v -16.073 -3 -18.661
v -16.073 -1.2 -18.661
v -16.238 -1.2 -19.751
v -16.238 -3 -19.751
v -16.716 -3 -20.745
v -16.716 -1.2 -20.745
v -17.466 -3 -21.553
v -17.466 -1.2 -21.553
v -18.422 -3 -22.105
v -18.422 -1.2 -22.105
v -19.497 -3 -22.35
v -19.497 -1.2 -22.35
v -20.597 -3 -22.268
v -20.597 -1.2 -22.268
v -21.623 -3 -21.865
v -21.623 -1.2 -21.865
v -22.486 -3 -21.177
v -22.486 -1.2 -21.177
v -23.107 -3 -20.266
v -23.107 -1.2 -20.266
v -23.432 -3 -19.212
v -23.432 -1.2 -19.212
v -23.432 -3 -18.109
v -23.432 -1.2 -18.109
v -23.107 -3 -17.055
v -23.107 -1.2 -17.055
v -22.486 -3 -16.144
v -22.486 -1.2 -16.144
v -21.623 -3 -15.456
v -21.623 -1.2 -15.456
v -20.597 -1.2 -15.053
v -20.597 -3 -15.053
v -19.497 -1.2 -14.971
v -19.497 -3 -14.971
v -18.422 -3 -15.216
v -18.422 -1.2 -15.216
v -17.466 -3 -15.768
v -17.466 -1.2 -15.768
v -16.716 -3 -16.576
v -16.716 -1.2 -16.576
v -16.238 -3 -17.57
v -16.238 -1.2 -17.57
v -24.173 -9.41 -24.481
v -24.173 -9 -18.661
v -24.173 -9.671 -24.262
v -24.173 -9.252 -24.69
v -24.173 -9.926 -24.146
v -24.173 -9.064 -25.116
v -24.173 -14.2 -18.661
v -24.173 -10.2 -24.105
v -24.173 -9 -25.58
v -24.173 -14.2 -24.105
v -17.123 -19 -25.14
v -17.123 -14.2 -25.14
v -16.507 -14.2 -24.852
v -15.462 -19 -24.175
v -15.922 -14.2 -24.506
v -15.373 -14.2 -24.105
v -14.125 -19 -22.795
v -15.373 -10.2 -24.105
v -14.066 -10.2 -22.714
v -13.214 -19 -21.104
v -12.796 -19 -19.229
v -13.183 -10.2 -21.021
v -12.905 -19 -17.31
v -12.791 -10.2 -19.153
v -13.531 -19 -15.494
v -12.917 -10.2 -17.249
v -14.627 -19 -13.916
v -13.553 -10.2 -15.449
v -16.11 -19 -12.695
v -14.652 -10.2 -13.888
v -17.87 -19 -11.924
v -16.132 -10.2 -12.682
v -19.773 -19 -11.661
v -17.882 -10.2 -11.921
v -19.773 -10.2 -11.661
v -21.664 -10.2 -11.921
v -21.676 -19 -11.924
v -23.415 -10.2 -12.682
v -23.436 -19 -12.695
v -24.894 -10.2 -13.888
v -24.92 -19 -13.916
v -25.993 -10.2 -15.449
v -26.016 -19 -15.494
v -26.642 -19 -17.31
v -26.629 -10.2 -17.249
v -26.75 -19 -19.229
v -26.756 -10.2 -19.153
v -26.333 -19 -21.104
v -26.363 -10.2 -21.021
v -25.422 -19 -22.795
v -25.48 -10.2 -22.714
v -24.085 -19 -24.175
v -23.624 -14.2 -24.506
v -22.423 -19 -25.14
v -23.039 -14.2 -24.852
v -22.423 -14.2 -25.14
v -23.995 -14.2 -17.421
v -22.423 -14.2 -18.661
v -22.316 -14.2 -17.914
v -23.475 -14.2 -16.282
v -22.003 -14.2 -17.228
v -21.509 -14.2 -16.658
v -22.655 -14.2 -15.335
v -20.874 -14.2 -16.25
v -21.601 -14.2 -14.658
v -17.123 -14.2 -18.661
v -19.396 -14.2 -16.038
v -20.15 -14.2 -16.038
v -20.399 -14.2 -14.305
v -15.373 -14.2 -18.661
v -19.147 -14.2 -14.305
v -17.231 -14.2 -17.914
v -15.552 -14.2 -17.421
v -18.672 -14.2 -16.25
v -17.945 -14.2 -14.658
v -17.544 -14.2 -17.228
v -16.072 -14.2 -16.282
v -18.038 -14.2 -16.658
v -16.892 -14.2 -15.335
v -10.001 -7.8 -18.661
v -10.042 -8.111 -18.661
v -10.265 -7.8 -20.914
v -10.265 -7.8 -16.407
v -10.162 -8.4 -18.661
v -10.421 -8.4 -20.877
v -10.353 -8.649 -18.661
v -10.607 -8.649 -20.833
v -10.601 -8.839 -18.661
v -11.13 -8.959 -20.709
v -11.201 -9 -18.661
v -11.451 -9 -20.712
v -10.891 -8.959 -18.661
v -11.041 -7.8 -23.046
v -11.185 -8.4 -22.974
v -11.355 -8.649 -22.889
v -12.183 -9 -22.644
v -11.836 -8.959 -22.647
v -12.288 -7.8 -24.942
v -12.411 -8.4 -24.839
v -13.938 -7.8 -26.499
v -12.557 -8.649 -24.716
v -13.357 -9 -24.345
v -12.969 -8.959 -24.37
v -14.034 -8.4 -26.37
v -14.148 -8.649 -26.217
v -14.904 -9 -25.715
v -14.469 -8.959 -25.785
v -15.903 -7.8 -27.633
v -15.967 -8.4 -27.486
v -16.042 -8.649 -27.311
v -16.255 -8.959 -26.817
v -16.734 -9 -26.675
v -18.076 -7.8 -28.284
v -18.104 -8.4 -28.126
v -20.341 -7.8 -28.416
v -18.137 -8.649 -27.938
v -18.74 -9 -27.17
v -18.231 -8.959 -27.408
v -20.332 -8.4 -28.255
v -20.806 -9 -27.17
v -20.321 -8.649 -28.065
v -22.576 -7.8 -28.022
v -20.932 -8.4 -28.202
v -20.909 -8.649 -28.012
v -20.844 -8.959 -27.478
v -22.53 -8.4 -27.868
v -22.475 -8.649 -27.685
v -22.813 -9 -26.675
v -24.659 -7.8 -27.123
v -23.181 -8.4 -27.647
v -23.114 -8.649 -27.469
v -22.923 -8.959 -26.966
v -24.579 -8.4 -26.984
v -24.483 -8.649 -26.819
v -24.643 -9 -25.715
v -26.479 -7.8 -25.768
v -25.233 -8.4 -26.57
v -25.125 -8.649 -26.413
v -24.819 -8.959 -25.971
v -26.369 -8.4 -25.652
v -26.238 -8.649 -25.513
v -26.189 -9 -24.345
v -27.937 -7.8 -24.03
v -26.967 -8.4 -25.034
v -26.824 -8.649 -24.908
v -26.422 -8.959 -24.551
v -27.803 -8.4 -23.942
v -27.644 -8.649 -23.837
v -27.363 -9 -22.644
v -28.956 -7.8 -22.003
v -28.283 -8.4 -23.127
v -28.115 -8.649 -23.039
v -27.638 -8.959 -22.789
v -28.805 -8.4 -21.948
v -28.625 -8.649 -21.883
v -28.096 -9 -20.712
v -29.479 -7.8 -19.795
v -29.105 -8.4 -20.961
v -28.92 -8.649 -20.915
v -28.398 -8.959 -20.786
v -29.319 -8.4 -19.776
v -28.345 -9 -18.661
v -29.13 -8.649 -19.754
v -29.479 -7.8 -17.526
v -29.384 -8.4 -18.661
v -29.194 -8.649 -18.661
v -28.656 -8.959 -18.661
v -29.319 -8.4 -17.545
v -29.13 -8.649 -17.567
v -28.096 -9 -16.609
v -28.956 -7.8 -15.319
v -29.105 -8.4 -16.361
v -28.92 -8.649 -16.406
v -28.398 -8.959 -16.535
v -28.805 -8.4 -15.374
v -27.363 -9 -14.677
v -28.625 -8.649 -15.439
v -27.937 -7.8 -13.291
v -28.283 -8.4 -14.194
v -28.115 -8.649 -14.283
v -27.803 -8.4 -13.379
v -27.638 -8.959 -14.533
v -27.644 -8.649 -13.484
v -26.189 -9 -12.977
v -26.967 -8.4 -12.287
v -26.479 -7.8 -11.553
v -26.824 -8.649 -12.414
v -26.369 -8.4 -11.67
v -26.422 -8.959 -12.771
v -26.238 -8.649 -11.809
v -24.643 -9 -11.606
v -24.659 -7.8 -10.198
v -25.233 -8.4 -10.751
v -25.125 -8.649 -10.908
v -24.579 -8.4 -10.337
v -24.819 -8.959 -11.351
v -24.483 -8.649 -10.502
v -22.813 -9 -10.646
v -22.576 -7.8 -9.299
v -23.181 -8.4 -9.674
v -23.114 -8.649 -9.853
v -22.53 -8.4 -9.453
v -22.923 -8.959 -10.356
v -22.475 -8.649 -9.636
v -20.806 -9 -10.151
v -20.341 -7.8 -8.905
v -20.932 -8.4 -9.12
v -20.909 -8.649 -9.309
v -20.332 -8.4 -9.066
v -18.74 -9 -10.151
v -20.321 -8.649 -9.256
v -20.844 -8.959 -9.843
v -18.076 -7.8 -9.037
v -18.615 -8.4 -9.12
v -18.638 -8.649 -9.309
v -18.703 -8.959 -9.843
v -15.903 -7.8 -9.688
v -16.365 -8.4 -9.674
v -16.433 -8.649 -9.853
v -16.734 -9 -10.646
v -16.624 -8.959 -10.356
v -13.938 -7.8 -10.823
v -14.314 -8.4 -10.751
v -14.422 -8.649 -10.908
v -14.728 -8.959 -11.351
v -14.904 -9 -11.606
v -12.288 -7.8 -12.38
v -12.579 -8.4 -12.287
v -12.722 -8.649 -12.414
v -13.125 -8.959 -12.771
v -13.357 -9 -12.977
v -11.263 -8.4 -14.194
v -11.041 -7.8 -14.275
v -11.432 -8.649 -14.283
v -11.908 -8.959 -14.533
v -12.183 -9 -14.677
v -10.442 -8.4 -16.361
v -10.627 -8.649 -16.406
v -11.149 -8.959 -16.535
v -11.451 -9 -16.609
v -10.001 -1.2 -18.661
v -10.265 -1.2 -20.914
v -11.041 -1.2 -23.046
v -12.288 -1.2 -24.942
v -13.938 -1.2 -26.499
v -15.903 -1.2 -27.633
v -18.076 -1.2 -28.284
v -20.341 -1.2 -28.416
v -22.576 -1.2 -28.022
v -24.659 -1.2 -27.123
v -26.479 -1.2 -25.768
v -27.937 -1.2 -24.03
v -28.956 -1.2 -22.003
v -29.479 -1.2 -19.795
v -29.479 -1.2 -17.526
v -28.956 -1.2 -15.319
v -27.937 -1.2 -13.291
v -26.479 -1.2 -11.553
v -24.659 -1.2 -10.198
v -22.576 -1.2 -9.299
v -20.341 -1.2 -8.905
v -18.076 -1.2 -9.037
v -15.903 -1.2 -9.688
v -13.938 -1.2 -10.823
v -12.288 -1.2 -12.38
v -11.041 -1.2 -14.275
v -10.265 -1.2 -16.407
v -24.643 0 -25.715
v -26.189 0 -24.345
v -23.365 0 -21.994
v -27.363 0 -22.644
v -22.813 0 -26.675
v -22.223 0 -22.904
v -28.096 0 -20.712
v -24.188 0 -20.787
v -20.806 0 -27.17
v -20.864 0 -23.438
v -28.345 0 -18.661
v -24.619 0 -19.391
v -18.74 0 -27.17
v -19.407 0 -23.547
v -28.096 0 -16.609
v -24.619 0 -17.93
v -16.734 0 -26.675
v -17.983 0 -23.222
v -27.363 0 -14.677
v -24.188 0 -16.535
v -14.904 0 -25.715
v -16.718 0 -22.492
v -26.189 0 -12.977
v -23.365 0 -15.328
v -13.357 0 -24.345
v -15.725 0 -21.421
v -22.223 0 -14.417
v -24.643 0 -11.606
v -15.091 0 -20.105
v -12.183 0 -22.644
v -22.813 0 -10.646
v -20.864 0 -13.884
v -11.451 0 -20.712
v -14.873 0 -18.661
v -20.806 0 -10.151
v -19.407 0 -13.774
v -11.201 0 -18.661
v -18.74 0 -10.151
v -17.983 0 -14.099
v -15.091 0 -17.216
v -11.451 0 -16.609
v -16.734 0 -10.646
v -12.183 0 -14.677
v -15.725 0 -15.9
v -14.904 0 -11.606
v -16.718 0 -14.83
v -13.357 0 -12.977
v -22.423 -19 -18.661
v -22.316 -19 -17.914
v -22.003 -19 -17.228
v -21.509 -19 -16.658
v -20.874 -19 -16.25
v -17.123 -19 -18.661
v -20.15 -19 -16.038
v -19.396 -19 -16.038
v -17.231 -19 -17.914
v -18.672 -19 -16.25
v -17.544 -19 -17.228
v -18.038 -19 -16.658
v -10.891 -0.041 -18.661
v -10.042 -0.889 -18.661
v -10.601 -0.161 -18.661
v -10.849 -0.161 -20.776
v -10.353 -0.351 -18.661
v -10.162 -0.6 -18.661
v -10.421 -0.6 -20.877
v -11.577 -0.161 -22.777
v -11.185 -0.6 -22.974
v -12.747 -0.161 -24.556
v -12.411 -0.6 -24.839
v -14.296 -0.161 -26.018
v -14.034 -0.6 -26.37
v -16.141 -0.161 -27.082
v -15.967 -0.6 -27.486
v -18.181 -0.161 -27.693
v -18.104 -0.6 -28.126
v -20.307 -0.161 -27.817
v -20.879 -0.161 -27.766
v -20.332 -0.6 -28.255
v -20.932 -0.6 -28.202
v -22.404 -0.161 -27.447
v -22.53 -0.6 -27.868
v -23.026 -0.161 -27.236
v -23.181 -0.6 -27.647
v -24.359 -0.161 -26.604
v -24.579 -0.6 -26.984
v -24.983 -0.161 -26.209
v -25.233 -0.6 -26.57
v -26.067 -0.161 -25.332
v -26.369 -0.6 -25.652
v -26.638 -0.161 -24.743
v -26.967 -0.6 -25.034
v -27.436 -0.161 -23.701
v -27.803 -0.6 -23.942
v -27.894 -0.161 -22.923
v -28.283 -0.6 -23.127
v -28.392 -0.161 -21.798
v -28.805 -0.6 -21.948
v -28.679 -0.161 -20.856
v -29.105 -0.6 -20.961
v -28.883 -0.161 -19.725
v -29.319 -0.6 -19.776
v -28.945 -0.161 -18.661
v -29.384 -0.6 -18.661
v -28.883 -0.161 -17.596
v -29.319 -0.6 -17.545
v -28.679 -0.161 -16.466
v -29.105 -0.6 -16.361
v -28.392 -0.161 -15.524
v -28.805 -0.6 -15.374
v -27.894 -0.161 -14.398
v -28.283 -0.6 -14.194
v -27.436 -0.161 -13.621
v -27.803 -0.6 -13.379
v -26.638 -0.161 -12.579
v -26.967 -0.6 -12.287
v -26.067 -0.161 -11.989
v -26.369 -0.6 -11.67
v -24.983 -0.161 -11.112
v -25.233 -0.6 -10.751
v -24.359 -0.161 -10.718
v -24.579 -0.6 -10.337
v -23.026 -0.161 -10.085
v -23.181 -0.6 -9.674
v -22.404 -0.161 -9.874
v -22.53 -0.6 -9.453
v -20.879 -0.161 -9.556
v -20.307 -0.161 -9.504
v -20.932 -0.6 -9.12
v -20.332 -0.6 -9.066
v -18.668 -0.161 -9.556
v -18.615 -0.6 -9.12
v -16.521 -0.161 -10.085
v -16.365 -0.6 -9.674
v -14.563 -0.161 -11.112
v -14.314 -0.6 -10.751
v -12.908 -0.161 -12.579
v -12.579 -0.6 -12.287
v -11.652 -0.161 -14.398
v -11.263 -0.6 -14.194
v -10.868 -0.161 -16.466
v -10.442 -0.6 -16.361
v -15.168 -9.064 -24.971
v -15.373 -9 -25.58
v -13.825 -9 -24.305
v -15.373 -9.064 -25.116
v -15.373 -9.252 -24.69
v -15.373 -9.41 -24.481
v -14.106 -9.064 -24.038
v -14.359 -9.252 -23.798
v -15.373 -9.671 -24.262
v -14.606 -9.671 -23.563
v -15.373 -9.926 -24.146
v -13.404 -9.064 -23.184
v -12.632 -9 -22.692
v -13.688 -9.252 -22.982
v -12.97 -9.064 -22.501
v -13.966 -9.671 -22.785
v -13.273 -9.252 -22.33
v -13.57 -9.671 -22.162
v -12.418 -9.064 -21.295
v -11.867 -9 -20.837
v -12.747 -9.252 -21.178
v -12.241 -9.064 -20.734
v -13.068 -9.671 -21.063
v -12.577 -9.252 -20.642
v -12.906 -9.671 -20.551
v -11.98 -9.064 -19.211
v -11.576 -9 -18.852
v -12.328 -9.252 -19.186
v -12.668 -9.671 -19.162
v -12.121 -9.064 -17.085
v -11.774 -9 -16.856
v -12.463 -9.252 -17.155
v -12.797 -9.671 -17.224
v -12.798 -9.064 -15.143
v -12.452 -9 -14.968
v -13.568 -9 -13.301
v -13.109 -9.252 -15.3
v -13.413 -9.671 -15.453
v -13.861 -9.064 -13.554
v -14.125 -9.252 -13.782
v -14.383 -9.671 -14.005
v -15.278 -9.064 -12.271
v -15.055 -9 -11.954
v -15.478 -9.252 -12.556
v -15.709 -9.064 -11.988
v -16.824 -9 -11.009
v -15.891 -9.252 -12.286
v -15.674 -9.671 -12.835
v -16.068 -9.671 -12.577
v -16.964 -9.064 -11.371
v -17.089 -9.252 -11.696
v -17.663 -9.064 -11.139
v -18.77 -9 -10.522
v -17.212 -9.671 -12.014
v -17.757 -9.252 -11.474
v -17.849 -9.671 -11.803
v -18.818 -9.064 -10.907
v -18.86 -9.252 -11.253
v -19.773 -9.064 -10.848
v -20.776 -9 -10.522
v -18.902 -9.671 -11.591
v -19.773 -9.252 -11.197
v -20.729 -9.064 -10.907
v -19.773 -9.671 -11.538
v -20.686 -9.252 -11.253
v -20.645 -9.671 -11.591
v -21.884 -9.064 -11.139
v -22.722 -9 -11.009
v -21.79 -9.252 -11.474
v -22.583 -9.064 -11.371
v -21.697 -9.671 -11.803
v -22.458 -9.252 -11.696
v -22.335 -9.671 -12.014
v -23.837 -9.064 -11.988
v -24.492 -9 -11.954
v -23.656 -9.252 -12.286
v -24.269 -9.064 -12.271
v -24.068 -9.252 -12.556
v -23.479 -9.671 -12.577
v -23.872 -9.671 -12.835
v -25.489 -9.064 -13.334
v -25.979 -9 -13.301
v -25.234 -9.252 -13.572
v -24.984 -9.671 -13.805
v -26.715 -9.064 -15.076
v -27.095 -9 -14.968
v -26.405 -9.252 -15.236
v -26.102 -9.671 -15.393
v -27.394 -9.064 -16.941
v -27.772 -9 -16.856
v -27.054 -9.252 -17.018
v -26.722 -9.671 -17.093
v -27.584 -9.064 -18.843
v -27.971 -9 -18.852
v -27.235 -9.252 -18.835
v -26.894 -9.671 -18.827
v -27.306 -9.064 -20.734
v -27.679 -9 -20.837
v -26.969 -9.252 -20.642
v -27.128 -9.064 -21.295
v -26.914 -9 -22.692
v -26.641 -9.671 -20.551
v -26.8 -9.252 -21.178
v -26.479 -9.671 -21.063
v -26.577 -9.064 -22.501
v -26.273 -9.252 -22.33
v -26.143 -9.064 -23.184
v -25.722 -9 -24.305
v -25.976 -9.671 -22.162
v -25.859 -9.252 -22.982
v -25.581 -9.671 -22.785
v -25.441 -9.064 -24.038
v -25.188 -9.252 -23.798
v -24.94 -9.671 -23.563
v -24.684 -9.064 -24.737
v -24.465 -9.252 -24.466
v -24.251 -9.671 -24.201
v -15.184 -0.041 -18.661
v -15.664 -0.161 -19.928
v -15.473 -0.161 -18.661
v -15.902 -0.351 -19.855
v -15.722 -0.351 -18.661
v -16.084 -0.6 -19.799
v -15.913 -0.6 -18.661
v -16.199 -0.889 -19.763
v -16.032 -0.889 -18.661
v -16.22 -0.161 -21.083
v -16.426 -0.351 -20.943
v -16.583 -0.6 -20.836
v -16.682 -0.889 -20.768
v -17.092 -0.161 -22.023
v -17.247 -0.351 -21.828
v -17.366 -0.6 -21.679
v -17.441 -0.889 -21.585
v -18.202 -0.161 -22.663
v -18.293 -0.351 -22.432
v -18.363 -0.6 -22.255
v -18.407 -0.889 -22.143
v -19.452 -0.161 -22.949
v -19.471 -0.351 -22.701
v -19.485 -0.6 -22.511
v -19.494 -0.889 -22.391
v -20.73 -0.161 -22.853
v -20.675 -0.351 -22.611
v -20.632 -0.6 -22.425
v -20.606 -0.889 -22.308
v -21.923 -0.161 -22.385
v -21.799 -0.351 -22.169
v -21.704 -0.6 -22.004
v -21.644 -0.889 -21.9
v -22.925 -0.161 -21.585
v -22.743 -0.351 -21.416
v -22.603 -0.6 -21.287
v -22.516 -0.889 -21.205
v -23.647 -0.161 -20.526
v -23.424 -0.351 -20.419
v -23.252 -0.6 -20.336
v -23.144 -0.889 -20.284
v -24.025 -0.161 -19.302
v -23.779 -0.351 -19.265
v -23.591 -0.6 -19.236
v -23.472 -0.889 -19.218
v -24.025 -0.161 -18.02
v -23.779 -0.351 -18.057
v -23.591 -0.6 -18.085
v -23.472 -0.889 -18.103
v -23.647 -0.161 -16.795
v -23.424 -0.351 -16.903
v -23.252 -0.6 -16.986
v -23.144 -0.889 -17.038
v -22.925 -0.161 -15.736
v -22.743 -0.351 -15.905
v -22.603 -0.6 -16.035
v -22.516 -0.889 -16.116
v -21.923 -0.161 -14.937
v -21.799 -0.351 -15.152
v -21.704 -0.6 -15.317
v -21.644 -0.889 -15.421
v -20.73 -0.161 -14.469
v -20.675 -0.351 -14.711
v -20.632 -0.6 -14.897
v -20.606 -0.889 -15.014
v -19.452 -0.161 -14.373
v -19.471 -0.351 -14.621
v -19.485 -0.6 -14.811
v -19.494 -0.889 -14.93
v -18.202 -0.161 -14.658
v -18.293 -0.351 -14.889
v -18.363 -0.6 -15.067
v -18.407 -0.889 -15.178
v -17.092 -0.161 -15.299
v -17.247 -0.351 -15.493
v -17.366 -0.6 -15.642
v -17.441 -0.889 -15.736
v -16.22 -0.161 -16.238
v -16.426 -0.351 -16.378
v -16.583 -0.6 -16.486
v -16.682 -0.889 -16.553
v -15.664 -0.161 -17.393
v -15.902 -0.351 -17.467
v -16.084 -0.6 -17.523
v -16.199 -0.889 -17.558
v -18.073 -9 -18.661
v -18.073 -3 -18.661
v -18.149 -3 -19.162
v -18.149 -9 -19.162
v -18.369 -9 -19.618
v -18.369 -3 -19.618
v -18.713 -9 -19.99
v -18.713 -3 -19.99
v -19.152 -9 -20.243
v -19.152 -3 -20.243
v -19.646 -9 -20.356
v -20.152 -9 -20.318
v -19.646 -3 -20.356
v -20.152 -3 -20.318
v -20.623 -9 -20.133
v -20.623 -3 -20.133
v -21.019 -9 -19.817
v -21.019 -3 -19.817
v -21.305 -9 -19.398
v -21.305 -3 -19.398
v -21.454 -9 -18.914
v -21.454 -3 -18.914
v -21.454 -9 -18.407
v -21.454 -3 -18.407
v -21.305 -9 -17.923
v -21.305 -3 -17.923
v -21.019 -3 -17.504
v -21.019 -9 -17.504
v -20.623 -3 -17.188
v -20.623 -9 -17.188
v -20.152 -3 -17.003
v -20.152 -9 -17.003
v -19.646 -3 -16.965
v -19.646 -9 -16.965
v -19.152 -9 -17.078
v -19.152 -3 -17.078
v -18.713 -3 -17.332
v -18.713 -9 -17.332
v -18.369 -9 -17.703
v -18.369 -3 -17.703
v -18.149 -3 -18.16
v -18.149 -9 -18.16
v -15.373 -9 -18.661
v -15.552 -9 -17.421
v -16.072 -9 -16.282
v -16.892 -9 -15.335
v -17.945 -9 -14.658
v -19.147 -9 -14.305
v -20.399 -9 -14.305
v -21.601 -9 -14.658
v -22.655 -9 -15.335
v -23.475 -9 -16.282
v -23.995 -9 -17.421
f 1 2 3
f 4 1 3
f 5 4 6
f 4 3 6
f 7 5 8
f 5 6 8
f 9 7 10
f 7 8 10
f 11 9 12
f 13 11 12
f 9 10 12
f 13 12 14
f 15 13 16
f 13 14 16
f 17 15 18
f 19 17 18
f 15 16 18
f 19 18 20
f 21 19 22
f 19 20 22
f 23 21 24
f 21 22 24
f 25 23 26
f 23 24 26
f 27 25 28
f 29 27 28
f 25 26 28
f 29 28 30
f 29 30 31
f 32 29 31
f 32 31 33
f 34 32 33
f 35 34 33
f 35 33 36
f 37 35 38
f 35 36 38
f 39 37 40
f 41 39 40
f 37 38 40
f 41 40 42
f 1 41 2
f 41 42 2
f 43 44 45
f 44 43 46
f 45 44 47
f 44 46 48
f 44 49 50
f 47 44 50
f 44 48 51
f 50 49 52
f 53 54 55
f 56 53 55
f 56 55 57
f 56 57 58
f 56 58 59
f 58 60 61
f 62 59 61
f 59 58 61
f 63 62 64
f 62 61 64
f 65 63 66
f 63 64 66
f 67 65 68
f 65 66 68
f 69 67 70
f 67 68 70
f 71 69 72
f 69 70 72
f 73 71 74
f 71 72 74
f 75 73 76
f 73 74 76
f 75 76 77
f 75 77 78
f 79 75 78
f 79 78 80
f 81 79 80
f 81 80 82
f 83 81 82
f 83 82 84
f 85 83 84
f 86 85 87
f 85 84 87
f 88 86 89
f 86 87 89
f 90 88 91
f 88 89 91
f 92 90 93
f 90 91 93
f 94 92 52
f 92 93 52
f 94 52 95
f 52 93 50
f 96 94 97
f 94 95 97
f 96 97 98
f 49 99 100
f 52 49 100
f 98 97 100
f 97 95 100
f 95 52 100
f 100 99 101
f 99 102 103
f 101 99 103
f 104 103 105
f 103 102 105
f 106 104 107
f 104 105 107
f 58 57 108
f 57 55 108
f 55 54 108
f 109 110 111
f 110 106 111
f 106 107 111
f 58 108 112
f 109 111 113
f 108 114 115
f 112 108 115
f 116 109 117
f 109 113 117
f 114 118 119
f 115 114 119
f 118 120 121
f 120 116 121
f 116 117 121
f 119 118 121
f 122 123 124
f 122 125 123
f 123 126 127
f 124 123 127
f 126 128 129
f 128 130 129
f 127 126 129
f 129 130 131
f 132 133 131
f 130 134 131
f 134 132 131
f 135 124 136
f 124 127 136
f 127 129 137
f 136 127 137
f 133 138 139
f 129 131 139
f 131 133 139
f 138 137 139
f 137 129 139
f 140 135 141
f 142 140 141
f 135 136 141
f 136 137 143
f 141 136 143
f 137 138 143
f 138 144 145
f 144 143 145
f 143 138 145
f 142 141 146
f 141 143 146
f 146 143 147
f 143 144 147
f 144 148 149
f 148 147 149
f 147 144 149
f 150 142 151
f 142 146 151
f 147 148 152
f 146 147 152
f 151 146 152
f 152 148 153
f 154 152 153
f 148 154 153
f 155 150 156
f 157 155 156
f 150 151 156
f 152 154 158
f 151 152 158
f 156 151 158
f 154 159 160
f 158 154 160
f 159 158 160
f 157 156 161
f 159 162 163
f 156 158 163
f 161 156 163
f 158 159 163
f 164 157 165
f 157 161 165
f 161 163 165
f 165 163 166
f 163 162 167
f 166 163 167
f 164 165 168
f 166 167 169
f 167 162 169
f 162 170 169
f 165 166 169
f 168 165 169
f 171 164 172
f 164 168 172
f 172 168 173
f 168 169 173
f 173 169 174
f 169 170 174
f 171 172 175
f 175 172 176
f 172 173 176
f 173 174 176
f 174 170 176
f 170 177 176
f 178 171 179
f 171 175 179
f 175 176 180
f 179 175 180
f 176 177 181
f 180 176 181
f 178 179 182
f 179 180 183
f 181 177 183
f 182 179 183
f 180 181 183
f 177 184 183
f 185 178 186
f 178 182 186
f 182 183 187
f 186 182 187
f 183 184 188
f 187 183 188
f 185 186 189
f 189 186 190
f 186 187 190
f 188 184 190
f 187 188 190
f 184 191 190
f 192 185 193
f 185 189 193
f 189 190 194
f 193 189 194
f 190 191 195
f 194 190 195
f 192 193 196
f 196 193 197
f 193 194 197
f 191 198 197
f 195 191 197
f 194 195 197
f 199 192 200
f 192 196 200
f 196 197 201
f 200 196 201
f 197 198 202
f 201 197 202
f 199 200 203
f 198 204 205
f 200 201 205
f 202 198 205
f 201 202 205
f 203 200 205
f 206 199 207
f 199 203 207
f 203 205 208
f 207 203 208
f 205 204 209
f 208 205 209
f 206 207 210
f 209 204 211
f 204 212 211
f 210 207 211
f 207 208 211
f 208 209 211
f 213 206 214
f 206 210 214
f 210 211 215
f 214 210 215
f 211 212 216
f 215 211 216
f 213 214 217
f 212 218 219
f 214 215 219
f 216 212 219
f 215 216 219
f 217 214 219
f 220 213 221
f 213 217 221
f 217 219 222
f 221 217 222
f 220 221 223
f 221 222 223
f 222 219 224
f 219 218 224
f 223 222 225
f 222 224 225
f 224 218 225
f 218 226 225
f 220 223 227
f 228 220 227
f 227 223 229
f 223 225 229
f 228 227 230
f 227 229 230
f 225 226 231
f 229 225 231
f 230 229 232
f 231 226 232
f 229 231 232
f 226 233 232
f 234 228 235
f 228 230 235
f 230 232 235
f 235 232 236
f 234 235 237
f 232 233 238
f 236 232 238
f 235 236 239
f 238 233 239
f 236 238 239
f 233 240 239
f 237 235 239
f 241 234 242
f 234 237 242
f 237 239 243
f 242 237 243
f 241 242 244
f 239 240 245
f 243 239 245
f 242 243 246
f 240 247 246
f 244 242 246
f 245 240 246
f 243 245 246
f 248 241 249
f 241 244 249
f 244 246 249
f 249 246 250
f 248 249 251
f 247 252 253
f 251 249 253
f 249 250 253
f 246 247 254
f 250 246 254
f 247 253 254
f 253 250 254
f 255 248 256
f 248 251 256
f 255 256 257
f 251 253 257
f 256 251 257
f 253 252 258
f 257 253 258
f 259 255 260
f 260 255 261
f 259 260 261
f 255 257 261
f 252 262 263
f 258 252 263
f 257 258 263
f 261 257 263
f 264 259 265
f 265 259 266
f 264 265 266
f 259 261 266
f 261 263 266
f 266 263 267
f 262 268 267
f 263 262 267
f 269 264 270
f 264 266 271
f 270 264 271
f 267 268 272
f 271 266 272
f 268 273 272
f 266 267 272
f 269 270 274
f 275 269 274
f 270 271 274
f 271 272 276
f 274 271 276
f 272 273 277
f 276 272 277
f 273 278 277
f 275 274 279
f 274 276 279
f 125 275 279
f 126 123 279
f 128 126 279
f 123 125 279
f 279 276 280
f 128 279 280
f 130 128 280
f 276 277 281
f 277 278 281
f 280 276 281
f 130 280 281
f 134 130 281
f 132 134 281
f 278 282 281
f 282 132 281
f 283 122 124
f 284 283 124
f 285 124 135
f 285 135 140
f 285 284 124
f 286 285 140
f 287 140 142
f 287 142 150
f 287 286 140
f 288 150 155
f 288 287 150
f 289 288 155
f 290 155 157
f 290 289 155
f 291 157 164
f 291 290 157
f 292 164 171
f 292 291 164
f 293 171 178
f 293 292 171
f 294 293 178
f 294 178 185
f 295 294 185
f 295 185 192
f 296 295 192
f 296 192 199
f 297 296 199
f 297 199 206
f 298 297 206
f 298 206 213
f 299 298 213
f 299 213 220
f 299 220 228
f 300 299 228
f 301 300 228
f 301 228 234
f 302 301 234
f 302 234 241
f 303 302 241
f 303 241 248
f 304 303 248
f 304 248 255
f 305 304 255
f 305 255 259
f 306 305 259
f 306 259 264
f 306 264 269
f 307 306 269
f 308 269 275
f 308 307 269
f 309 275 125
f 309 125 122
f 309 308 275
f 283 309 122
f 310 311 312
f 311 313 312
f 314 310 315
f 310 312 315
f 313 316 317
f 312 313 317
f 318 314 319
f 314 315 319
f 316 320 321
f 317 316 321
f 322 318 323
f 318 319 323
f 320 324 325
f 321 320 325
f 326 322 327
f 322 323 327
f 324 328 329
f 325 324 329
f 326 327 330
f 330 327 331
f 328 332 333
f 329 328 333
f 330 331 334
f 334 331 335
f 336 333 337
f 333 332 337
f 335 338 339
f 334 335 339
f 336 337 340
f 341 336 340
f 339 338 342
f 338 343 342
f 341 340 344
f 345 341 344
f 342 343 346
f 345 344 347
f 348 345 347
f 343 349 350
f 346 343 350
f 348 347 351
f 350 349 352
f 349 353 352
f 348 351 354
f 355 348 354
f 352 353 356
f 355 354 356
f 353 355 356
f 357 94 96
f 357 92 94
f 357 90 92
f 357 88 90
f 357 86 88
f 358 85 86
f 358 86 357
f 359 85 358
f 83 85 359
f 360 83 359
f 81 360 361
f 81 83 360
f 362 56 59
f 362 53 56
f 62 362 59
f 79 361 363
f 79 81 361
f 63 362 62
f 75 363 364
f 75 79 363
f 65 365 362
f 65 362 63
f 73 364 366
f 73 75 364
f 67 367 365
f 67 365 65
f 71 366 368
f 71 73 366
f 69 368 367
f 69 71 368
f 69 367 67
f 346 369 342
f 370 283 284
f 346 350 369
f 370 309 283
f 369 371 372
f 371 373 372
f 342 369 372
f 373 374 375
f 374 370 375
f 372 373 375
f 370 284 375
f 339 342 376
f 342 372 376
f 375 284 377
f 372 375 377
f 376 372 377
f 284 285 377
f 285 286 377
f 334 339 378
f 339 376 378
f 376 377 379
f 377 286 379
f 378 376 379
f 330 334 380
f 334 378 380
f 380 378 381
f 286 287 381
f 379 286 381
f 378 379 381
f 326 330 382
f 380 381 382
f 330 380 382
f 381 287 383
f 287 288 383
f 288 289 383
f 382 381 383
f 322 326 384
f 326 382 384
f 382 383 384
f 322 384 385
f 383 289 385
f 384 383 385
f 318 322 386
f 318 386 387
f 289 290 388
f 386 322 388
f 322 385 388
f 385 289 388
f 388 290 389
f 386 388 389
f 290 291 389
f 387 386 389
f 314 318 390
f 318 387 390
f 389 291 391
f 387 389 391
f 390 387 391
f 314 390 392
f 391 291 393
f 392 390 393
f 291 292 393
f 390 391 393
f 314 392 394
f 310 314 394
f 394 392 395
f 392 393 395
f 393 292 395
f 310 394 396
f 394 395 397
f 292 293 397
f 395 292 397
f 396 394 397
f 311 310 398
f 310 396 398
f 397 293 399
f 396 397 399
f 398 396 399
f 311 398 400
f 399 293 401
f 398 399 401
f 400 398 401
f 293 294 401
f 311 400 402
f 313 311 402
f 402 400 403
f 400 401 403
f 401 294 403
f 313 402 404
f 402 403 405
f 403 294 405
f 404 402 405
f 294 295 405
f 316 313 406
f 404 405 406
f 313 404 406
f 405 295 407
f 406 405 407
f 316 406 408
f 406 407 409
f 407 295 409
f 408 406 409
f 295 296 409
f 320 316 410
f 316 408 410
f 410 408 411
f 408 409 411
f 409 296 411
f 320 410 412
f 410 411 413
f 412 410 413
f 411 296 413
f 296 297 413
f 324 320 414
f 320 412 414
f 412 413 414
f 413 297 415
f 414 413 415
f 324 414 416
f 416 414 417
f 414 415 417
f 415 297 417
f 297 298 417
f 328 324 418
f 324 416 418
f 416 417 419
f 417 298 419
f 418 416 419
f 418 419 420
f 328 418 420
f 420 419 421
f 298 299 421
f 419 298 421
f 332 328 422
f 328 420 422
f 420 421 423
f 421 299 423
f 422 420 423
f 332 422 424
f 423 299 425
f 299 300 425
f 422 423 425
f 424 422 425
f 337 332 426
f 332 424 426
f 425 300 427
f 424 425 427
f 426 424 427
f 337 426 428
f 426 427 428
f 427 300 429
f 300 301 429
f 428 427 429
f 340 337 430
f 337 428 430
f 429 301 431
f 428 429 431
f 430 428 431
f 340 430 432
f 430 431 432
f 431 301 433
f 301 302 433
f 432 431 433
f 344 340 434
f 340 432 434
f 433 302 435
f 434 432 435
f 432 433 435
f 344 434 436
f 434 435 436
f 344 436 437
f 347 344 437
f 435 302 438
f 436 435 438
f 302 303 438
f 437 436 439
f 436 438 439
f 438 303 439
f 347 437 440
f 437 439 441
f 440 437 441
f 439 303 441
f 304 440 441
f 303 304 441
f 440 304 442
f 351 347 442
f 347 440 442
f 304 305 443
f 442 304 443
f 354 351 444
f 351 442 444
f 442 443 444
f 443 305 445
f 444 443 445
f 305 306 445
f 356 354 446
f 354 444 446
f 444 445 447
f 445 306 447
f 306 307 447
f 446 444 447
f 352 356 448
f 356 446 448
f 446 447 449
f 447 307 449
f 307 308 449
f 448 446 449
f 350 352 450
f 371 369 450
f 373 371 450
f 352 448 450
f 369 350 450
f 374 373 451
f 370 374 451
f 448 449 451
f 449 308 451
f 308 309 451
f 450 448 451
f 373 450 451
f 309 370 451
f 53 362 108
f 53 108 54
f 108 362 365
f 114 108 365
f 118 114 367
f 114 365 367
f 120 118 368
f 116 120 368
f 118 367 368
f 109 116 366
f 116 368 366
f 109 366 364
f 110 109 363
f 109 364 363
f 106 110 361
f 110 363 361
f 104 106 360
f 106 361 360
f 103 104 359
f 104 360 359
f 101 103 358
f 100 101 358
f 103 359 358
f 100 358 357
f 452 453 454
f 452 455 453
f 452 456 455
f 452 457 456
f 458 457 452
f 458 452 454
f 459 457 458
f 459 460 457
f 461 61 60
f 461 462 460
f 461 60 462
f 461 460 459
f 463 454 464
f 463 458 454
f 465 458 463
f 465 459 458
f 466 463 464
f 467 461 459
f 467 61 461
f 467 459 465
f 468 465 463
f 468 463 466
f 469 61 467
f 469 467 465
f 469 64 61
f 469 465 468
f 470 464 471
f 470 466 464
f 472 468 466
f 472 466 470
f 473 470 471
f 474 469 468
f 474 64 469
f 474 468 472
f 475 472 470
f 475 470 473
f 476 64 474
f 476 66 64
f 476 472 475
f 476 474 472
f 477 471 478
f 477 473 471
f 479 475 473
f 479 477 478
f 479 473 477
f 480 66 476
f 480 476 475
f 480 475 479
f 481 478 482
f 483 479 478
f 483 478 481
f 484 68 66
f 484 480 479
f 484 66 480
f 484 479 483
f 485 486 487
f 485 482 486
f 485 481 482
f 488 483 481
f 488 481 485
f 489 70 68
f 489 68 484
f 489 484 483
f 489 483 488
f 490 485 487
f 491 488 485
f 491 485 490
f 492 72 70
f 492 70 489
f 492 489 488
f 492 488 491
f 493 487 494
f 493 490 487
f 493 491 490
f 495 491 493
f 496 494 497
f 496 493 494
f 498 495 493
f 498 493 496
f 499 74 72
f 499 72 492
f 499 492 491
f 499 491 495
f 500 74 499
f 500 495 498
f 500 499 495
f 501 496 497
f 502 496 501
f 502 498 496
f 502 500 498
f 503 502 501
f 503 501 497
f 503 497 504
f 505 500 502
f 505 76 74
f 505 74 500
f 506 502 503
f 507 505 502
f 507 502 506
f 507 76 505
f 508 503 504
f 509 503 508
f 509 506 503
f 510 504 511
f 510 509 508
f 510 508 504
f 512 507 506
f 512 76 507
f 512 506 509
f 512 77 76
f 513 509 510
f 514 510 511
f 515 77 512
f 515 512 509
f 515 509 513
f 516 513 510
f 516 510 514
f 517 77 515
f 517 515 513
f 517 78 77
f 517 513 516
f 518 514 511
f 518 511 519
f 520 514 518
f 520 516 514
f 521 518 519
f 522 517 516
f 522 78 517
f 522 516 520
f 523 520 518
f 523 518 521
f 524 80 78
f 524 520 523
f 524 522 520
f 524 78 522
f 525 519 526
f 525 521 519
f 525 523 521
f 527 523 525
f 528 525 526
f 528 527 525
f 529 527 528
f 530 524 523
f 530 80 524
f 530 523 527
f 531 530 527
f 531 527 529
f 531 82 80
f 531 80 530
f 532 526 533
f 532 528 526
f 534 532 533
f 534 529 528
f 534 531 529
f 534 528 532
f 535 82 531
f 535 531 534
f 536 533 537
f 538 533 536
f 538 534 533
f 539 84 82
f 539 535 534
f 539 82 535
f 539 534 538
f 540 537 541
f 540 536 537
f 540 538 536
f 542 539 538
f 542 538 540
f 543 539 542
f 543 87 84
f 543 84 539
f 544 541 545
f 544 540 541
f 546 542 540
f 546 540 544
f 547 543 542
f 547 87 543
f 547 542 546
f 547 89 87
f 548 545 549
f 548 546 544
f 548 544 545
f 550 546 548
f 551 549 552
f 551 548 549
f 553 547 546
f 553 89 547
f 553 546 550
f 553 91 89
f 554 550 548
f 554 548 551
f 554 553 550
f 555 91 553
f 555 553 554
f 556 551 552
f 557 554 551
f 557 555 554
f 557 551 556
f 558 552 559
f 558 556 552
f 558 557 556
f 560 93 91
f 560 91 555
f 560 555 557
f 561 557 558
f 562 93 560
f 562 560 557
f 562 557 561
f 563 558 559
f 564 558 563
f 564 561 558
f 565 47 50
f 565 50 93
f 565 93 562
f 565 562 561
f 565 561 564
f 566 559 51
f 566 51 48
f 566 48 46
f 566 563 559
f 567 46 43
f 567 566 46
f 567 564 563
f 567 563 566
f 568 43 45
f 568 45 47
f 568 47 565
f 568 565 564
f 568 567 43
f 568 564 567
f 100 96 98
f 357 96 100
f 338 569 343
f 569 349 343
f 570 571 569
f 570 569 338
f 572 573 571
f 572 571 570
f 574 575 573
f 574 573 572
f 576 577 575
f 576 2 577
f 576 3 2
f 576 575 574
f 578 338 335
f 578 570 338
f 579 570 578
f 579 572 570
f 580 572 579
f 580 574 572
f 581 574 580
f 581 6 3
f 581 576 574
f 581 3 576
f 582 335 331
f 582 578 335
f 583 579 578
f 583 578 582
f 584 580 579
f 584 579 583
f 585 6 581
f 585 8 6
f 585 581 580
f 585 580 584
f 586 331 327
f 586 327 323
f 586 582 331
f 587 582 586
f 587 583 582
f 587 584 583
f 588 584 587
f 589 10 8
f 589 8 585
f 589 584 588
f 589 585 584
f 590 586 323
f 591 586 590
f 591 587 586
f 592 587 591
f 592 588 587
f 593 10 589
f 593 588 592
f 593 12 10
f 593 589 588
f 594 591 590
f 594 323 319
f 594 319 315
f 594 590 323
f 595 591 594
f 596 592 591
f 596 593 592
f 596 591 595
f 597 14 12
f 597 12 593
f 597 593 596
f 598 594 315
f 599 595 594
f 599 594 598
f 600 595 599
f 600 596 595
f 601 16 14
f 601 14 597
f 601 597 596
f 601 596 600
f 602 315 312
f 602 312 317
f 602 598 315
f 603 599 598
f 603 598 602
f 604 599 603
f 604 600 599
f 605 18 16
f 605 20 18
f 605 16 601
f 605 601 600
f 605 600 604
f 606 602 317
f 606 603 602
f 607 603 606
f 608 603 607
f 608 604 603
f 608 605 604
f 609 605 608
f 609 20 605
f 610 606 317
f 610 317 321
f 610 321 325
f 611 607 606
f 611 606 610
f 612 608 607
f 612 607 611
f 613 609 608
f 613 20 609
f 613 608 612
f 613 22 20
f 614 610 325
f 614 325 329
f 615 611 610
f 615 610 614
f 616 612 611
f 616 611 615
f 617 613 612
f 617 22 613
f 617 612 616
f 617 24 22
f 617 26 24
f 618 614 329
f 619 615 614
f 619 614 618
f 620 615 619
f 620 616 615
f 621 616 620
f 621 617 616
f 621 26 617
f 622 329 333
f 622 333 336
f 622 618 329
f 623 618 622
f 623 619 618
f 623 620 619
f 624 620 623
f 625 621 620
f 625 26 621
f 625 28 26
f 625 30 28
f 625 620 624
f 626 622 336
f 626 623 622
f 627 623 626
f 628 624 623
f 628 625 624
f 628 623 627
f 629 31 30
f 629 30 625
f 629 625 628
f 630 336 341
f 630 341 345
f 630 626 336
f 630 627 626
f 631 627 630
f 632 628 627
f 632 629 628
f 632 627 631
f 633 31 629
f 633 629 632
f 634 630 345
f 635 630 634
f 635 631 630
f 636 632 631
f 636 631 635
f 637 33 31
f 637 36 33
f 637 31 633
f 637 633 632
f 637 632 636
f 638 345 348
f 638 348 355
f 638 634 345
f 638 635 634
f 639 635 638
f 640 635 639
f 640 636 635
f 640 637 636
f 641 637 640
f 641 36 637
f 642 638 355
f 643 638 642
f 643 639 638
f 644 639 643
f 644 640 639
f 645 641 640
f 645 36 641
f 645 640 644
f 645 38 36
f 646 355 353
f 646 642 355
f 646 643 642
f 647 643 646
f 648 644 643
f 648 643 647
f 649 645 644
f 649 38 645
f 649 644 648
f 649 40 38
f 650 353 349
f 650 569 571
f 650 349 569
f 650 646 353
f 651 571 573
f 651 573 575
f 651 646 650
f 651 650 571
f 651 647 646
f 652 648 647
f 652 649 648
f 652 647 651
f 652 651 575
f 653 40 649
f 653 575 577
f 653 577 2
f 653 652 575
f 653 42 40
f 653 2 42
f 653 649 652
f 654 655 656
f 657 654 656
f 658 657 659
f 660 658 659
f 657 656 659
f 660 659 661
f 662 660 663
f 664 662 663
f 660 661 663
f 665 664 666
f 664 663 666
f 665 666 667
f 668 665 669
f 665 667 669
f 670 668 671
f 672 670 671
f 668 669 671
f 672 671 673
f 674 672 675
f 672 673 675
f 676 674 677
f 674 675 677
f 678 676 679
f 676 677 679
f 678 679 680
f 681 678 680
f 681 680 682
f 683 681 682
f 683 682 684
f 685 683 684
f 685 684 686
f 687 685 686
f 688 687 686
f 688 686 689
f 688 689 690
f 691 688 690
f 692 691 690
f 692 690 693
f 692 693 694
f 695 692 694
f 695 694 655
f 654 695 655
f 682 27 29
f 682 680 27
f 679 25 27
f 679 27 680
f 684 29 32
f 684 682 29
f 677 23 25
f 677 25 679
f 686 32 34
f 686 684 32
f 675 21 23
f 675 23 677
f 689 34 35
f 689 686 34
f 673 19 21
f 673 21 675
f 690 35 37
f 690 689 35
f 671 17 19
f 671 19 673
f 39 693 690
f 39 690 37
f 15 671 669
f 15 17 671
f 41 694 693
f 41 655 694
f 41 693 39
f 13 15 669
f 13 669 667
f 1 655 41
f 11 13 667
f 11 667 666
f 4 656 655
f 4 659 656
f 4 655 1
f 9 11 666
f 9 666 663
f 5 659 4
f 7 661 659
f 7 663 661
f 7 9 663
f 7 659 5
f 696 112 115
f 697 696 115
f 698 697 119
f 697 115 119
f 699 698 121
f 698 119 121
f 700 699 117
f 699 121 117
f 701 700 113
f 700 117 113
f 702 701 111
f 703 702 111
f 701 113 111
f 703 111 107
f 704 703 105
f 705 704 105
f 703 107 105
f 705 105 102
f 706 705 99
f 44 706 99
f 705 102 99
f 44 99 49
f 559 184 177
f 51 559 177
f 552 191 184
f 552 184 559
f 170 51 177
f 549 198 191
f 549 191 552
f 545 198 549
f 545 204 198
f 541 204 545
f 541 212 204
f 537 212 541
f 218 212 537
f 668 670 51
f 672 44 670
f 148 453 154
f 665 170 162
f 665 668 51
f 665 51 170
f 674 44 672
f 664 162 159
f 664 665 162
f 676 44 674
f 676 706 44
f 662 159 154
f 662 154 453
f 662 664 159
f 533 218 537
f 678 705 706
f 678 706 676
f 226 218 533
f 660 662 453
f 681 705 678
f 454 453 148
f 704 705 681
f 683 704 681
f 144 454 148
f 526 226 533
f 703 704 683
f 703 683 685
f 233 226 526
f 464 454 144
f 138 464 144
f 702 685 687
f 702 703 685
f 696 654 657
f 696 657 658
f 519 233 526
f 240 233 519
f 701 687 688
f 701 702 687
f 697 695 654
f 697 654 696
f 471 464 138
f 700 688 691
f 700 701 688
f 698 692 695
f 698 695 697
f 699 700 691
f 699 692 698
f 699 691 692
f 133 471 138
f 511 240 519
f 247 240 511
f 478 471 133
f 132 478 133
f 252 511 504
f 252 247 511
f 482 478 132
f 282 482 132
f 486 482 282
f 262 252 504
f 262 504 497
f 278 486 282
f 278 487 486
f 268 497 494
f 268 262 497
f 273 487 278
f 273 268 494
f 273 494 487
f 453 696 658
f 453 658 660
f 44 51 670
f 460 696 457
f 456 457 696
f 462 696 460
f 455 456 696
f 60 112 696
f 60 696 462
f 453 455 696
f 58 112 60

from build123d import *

# Parameters (mm, degrees)
SKETCH067_W     = 20
SKETCH067_H     = 20
PAD025_DEPTH    = 9
SKETCH061_R     = 7
PAD024_DEPTH    = 10
POCKET040_DEPTH = 8
SKETCH063_W     = 8.75
SKETCH063_H     = 5.2
POCKET036_DEPTH = 1
SKETCH060_R     = 3.7
POCKET035_DEPTH = 3
SKETCH059_R     = 1.675
POCKET039_DEPTH = 5
SKETCH068_R     = 16.754851
SKETCH068_R_2   = 9.771783
POCKET041_DEPTH = 20
SKETCH062_R     = 1.7
POCKET042_DEPTH = 20
FILLET008_R     = 1.2
POCKET043_DEPTH = 5.2


with BuildPart() as part:
    # Sketch067 → Pad025 (new body)
    with BuildSketch(Plane.XZ):
        with Locations((-19.773271, -18.660706)):
            Rectangle(SKETCH067_W, SKETCH067_H)
    extrude(amount=PAD025_DEPTH)

    # Sketch061 (on Face6 of Pad025) → Pad024 (join)
    with BuildSketch(Plane.XZ.offset(9)):
        with Locations((-19.773271, -18.660706)):
            Circle(SKETCH061_R)
    extrude(amount=PAD024_DEPTH)

    # Sketch065 (on Face8 of Pad024) → Pocket040 (cut)
    with BuildSketch(Plane.XZ.offset(19)):
        with BuildLine():
            Line((-17.123271, -18.660706), (-17.123271, -31.745383))
            Line((-17.123271, -31.745383), (-22.423271, -31.745383))
            Line((-22.423271, -31.745383), (-22.423271, -18.660706))
            ThreePointArc((-17.123271, -18.660706), (-19.773271, -16.010706), (-22.423271, -18.660706))
        make_face()
    extrude(amount=-POCKET040_DEPTH, mode=Mode.SUBTRACT)

    # Sketch063 (on Face6 of Pocket040) → Pocket036 (cut)
    with BuildSketch(Plane(origin=(0, 0, -28.660706), x_dir=(1, 0, 0), z_dir=(0, 0, -1))):
        with Locations((-19.773271, 11.6)):
            Rectangle(SKETCH063_W, SKETCH063_H)
    extrude(amount=-POCKET036_DEPTH, mode=Mode.SUBTRACT)

    # Sketch060 (on Face4 of Pocket036) → Pocket035 (cut)
    with BuildSketch(Plane(origin=(0, 0, 0), x_dir=(1, 0, 0), z_dir=(0, 1, 0))):
        with Locations((-19.773271, 18.660706)):
            Circle(SKETCH060_R)
    extrude(amount=-POCKET035_DEPTH, mode=Mode.SUBTRACT)

    # Sketch059 (on Face11 of Pocket035) → Pocket039 (cut)
    with BuildSketch(Plane.XZ.offset(19)):
        with Locations((-19.773271, -18.660706)):
            Circle(SKETCH059_R)
    extrude(amount=-POCKET039_DEPTH, mode=Mode.SUBTRACT)

    # Sketch068 (on Face4 of Pocket039) → Pocket041 (cut)
    with BuildSketch(Plane(origin=(0, 0, 0), x_dir=(1, 0, 0), z_dir=(0, 1, 0))):
        with Locations((-19.773271, 18.660706)):
            Circle(SKETCH068_R)
        with Locations((-19.773271, 18.660706)):
            Circle(SKETCH068_R_2, mode=Mode.SUBTRACT)
    extrude(amount=-POCKET041_DEPTH, mode=Mode.SUBTRACT)

    # Sketch062 → Pocket042 (cut)
    with BuildSketch(Plane(origin=(0, -3, 0), x_dir=(1, 0, 0), z_dir=(0, 1, 0))):
        with Locations((-19.773271, 18.660706)):
            Circle(SKETCH062_R)
    extrude(amount=-POCKET042_DEPTH, mode=Mode.SUBTRACT)

    # Fillet008
    fillet008_edges = [part.edges().sort_by_distance(p)[0] for p in [
        (-19.773271, -9, -27.660706),
        (-25.172051, -9, -10.515712),
        (-11.628277, -9, -24.059485),
        (-26.773271, -9, -18.660706),
        (-29.545054, 0, -18.660706),
        (-23.473271, 0, -18.660706),
    ]]
    fillet(fillet008_edges, radius=FILLET008_R)

    # Sketch064 → Pocket043 (cut)
    with BuildSketch(Plane.XZ.offset(14.2)):
        with BuildLine():
            ThreePointArc((-15.373271, -18.660706), (-19.773271, -14.260706), (-24.173271, -18.660706))
            Line((-24.173271, -18.660706), (-24.173271, -31.35503))
            Line((-24.173271, -31.35503), (-15.373271, -31.35503))
            Line((-15.373271, -18.660706), (-15.373271, -31.35503))
        make_face()
    extrude(amount=-POCKET043_DEPTH, mode=Mode.SUBTRACT)


solid = part.part
